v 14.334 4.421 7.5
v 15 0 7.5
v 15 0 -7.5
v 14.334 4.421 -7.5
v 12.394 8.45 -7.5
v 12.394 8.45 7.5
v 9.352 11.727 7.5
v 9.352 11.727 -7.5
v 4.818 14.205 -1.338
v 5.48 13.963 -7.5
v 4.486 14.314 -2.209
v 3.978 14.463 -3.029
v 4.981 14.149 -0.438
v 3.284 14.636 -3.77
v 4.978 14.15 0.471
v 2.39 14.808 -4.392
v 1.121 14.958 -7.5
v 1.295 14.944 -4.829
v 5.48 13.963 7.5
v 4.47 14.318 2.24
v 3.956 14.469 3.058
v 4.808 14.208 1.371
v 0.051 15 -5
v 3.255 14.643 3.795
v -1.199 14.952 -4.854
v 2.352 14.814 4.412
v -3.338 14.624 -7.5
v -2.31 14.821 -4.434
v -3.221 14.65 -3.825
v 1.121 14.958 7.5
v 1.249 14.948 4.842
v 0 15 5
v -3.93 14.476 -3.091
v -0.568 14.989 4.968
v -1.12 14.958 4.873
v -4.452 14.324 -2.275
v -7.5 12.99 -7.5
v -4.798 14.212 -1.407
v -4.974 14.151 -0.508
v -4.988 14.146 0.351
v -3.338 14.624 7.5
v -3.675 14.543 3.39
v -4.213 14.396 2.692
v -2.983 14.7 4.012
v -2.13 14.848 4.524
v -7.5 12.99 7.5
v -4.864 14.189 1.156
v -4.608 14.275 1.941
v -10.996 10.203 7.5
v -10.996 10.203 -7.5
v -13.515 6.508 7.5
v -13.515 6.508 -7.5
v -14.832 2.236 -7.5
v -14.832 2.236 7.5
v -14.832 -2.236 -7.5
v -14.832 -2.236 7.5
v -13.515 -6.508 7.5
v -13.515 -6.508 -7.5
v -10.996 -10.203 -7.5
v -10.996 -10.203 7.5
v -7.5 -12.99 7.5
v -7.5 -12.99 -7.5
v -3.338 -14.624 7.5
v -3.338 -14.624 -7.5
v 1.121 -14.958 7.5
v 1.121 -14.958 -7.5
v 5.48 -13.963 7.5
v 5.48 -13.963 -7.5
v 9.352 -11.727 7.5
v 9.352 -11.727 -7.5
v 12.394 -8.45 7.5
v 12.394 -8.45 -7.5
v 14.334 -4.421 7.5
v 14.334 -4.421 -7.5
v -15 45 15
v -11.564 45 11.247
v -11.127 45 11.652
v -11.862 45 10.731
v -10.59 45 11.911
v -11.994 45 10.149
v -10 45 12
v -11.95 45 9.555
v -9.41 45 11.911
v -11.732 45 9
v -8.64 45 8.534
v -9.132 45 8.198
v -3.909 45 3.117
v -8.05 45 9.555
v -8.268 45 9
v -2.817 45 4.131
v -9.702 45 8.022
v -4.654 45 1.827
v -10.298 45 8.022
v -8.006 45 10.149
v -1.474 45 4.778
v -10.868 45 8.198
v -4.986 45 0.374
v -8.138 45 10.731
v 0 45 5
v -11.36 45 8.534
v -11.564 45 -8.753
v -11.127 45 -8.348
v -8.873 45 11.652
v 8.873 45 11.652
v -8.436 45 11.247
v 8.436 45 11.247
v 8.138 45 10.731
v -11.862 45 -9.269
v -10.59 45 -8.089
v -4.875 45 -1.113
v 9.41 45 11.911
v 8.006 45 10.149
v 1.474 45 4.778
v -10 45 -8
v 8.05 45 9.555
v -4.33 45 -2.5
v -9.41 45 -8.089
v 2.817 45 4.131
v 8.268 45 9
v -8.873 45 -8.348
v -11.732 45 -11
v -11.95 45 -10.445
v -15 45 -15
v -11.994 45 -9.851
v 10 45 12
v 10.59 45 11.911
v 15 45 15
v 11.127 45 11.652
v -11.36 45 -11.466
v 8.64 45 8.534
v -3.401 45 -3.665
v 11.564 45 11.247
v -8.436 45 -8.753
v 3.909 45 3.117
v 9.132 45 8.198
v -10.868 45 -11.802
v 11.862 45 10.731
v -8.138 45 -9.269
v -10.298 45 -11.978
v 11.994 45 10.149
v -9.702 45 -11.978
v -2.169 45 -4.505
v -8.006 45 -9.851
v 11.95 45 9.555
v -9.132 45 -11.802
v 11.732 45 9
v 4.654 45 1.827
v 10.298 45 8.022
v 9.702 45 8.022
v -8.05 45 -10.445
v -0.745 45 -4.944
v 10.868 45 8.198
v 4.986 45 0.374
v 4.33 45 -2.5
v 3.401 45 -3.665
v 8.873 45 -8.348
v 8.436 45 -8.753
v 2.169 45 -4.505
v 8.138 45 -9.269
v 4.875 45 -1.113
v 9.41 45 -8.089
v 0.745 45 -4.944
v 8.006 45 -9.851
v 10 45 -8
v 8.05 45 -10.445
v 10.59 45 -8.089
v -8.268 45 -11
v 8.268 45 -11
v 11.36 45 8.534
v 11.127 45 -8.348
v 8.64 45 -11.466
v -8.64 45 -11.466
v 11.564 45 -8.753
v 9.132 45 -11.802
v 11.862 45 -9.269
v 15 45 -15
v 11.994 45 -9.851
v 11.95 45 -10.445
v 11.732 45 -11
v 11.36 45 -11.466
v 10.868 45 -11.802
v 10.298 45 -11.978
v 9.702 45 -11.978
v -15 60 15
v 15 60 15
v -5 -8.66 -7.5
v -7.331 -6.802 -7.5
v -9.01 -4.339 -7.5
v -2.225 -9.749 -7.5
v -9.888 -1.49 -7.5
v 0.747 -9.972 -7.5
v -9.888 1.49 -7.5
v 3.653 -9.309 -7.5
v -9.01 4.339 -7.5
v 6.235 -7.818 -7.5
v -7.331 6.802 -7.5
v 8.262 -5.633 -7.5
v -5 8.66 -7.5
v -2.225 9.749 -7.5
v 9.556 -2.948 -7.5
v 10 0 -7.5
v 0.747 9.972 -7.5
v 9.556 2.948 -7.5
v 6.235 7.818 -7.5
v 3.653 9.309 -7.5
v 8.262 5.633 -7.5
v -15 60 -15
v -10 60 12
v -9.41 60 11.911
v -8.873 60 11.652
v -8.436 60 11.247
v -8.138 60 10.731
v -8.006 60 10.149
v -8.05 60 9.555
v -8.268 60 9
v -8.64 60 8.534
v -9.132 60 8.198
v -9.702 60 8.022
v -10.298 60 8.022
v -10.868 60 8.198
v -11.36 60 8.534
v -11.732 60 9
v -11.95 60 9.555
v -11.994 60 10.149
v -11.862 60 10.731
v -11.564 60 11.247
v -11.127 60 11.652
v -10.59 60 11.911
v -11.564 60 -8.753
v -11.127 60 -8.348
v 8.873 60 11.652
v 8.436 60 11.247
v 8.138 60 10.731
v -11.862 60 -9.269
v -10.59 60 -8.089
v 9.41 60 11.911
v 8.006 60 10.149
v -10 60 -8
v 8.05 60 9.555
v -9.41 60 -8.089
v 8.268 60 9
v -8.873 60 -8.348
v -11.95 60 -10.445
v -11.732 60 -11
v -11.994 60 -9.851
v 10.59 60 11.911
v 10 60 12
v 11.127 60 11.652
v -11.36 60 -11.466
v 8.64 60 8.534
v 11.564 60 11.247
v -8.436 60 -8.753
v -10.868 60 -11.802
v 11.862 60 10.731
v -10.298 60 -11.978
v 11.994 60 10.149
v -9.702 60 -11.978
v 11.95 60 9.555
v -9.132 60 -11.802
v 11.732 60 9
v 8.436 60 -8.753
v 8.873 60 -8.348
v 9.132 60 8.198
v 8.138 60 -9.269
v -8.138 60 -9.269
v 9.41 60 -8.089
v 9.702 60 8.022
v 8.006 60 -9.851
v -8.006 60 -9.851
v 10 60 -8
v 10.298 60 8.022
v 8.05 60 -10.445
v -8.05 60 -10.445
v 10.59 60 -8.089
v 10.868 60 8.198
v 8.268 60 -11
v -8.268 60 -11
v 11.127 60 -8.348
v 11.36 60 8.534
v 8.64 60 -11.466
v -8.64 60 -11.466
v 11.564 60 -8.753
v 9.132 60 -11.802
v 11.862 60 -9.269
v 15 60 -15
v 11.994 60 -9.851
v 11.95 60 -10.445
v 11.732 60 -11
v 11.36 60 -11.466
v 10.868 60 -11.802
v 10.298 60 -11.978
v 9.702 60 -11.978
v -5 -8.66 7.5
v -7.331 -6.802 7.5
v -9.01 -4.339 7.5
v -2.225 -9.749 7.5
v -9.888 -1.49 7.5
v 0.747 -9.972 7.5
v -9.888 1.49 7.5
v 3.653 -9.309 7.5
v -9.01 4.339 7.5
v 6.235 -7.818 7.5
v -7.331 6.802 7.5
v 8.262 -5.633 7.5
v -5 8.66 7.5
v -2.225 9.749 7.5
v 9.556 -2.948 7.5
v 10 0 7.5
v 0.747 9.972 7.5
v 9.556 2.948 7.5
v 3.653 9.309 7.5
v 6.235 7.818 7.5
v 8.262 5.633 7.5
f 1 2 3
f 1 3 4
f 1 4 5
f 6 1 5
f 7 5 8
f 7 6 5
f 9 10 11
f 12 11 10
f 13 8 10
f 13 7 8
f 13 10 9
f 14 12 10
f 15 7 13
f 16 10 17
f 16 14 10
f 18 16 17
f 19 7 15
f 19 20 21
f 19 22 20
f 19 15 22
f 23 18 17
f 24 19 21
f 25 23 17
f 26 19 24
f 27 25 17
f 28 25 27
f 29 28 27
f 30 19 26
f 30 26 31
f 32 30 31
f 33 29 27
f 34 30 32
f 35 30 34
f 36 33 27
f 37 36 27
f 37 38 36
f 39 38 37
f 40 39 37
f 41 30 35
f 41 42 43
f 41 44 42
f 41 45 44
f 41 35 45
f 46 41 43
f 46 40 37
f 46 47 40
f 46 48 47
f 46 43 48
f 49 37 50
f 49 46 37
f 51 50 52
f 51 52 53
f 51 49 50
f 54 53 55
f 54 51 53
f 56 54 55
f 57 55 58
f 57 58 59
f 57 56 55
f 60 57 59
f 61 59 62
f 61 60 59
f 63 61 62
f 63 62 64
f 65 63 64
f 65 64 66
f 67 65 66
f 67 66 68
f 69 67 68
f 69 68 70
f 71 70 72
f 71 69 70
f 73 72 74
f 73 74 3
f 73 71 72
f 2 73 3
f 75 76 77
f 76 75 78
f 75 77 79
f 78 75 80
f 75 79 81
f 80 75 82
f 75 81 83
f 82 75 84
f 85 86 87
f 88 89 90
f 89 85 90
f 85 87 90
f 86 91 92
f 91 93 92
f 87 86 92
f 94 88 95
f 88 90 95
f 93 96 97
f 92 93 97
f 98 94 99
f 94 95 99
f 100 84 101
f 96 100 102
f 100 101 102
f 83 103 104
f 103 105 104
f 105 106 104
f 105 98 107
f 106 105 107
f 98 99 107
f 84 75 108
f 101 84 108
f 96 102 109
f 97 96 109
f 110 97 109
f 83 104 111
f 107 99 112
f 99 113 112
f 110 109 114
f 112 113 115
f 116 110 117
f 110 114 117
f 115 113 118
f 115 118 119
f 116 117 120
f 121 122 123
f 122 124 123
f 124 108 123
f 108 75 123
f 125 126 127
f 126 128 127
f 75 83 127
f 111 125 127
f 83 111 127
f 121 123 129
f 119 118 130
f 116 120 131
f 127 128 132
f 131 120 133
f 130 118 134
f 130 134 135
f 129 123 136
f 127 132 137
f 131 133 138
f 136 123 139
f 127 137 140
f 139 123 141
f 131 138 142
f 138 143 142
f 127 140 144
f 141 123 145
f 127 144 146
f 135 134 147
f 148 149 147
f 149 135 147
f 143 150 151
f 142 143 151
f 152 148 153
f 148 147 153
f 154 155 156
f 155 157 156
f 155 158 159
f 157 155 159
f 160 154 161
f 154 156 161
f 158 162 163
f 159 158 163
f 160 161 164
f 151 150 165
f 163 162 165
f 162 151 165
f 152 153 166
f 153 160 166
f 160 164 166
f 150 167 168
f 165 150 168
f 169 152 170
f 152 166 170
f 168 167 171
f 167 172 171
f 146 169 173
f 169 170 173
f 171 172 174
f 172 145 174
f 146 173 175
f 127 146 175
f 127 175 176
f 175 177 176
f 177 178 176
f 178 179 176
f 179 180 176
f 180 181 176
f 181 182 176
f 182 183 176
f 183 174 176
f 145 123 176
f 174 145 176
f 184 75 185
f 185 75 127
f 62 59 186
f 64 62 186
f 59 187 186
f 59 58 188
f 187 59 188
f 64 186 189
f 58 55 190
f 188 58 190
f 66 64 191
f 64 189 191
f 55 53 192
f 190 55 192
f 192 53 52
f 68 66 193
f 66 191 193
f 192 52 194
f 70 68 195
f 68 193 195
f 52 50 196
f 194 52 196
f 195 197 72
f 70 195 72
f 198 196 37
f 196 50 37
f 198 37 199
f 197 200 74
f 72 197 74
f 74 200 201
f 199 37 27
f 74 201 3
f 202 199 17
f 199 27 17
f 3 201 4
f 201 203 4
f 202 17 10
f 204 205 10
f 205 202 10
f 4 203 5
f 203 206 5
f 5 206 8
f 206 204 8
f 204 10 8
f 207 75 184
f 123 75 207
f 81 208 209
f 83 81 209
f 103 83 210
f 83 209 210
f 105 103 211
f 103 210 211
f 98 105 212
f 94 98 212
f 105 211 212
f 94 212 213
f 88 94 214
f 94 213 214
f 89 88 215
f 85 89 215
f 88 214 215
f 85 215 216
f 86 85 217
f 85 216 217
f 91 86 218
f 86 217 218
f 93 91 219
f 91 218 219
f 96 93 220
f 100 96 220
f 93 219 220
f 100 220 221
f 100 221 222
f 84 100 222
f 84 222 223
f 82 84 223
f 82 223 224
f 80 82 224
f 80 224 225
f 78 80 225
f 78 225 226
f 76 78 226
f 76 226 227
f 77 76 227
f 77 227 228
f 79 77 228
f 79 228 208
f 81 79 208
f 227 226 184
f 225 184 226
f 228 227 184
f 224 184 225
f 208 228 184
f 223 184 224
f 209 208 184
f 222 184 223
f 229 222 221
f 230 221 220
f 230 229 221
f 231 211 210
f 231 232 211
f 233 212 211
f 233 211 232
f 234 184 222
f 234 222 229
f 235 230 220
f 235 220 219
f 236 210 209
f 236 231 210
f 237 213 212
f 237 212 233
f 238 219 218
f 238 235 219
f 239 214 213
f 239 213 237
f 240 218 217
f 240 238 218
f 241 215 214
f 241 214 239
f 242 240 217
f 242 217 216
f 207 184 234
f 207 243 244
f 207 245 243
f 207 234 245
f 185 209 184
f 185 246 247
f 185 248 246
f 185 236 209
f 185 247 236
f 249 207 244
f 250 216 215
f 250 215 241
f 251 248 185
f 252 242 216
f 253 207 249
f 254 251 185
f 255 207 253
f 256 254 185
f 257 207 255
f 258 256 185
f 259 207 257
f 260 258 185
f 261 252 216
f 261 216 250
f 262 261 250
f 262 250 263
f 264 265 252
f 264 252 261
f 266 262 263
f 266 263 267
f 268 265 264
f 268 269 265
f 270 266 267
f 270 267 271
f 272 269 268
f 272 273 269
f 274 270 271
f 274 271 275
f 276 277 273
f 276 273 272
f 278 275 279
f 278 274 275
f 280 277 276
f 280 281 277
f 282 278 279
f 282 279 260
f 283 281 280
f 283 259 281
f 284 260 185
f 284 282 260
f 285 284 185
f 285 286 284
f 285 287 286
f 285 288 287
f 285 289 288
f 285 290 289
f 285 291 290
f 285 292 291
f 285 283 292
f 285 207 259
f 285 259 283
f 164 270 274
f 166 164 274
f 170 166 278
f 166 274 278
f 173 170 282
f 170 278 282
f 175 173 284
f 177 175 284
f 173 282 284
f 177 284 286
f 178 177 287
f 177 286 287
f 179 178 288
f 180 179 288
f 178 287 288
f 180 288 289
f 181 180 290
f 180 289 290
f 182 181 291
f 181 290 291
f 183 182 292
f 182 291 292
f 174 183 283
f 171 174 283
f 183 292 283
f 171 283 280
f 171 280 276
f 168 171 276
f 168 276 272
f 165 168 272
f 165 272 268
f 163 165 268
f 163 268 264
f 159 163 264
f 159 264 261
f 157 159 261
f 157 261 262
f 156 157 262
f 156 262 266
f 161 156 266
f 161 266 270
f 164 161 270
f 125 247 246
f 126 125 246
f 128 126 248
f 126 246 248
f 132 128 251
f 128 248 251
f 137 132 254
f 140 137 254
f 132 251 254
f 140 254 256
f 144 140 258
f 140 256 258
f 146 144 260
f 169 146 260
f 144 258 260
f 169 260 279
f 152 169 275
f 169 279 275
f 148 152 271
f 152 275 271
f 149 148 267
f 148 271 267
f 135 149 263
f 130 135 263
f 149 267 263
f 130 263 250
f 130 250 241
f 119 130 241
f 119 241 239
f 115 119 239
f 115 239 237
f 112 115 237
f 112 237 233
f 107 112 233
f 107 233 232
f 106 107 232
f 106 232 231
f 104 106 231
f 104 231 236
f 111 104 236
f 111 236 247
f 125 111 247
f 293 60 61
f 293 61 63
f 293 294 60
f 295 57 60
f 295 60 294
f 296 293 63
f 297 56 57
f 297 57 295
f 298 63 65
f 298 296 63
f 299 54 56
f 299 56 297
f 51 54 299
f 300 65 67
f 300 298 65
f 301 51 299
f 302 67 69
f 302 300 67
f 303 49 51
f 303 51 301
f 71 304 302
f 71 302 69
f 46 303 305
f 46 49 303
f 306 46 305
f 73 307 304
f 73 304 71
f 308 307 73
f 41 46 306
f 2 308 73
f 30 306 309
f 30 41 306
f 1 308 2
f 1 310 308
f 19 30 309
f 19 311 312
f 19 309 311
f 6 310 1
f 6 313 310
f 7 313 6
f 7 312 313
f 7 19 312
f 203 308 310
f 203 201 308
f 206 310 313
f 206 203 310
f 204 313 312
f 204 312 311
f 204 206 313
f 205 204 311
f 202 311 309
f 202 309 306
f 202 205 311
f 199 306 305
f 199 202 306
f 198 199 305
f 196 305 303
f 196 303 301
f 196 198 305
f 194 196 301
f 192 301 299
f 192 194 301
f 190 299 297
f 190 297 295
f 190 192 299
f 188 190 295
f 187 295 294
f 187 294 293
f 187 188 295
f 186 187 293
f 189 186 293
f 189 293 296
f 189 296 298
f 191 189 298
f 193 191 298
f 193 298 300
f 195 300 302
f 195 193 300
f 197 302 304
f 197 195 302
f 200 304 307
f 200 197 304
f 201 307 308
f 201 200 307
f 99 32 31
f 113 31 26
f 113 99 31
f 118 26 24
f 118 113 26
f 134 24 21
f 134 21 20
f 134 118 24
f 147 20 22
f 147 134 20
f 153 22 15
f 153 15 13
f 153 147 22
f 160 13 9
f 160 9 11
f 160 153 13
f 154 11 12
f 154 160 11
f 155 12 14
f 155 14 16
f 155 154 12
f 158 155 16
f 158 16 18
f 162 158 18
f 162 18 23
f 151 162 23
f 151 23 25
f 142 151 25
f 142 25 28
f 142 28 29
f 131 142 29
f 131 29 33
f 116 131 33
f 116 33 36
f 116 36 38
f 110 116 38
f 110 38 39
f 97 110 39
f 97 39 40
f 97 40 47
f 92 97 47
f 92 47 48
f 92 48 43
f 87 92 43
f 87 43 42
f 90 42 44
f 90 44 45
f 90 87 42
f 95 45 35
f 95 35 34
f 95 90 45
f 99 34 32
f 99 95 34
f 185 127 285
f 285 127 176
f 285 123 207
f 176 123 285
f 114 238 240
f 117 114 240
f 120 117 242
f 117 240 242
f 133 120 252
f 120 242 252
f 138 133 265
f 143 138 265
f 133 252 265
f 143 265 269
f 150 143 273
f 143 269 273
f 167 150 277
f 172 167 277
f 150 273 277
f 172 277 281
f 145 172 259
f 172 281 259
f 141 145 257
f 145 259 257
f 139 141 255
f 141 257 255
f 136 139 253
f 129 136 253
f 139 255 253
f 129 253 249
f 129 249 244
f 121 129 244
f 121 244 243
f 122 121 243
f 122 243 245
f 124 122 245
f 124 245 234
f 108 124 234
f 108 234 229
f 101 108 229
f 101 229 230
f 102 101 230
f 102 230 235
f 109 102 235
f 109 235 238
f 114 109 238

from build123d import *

# Parameters (mm, degrees)
SKETCH_1_R           = 15
SKETCH_1_R_2         = 10
EXTRUDE_1_DEPTH      = 7.5
EXTRUDE_2_REACH      = 64.3
EXTRUDE_2_END_RADIUS = 15
SKETCH_3_R           = 5
SKETCH_4_W           = 30
SKETCH_4_H           = 30
EXTRUDE_3_DEPTH      = 15
SKETCH_5_R           = 2
CUT_EXTRUDE_1_DEPTH  = 78.942286456


with BuildPart() as part:
    # 草图1 → 凸台-拉伸1 (new, symmetric)
    with BuildSketch(Plane.XY):
        Circle(SKETCH_1_R)
        Circle(SKETCH_1_R_2, mode=Mode.SUBTRACT)
    extrude(amount=EXTRUDE_1_DEPTH, both=True)

    # 凸台-拉伸2: up to this cylinder (the profile starts outside it)
    extrude_2_end = Plane(origin=(0, 0, 0), z_dir=(0, 0, -1)) * Cylinder(EXTRUDE_2_END_RADIUS, 159.6, mode=Mode.PRIVATE)
    # 草图3 → 凸台-拉伸2 (add, up to the surface)
    with BuildSketch(Plane(origin=(0, 45, 0), x_dir=(1, 0, 0), z_dir=(0, 1, 0)), mode=Mode.PRIVATE) as extrude_2_sk1:
        with Locations(Location((0, 0, 0), (0, 0, 270))):
            Circle(SKETCH_3_R)
    extrude_2_tool1 = extrude(extrude_2_sk1.sketch, amount=-EXTRUDE_2_REACH, mode=Mode.PRIVATE) - extrude_2_end
    add(extrude_2_tool1.solids().sort_by_distance((0, 45, 0))[0])

    # 草图4 → 凸台-拉伸3 (add)
    with BuildSketch(Plane(origin=(0, 45, 0), x_dir=(1, 0, 0), z_dir=(0, 1, 0))):
        Rectangle(SKETCH_4_W, SKETCH_4_H)
    extrude(amount=EXTRUDE_3_DEPTH)

    # 草图5 → 切除-拉伸1 (cut, through all)
    with BuildSketch(Plane(origin=(0, 60, 0), x_dir=(1, 0, 0), z_dir=(0, 1, 0))):
        with Locations(Location((10, 10, 0), (0, 0, 270))):
            Circle(SKETCH_5_R)
        with Locations(Location((-10, 10, 0), (0, 0, 270))):
            Circle(SKETCH_5_R)
        with Locations(Location((10, -10, 0), (0, 0, 270))):
            Circle(SKETCH_5_R)
        with Locations(Location((-10, -10, 0), (0, 0, 270))):
            Circle(SKETCH_5_R)
    extrude(amount=-CUT_EXTRUDE_1_DEPTH, mode=Mode.SUBTRACT)


solid = part.part
